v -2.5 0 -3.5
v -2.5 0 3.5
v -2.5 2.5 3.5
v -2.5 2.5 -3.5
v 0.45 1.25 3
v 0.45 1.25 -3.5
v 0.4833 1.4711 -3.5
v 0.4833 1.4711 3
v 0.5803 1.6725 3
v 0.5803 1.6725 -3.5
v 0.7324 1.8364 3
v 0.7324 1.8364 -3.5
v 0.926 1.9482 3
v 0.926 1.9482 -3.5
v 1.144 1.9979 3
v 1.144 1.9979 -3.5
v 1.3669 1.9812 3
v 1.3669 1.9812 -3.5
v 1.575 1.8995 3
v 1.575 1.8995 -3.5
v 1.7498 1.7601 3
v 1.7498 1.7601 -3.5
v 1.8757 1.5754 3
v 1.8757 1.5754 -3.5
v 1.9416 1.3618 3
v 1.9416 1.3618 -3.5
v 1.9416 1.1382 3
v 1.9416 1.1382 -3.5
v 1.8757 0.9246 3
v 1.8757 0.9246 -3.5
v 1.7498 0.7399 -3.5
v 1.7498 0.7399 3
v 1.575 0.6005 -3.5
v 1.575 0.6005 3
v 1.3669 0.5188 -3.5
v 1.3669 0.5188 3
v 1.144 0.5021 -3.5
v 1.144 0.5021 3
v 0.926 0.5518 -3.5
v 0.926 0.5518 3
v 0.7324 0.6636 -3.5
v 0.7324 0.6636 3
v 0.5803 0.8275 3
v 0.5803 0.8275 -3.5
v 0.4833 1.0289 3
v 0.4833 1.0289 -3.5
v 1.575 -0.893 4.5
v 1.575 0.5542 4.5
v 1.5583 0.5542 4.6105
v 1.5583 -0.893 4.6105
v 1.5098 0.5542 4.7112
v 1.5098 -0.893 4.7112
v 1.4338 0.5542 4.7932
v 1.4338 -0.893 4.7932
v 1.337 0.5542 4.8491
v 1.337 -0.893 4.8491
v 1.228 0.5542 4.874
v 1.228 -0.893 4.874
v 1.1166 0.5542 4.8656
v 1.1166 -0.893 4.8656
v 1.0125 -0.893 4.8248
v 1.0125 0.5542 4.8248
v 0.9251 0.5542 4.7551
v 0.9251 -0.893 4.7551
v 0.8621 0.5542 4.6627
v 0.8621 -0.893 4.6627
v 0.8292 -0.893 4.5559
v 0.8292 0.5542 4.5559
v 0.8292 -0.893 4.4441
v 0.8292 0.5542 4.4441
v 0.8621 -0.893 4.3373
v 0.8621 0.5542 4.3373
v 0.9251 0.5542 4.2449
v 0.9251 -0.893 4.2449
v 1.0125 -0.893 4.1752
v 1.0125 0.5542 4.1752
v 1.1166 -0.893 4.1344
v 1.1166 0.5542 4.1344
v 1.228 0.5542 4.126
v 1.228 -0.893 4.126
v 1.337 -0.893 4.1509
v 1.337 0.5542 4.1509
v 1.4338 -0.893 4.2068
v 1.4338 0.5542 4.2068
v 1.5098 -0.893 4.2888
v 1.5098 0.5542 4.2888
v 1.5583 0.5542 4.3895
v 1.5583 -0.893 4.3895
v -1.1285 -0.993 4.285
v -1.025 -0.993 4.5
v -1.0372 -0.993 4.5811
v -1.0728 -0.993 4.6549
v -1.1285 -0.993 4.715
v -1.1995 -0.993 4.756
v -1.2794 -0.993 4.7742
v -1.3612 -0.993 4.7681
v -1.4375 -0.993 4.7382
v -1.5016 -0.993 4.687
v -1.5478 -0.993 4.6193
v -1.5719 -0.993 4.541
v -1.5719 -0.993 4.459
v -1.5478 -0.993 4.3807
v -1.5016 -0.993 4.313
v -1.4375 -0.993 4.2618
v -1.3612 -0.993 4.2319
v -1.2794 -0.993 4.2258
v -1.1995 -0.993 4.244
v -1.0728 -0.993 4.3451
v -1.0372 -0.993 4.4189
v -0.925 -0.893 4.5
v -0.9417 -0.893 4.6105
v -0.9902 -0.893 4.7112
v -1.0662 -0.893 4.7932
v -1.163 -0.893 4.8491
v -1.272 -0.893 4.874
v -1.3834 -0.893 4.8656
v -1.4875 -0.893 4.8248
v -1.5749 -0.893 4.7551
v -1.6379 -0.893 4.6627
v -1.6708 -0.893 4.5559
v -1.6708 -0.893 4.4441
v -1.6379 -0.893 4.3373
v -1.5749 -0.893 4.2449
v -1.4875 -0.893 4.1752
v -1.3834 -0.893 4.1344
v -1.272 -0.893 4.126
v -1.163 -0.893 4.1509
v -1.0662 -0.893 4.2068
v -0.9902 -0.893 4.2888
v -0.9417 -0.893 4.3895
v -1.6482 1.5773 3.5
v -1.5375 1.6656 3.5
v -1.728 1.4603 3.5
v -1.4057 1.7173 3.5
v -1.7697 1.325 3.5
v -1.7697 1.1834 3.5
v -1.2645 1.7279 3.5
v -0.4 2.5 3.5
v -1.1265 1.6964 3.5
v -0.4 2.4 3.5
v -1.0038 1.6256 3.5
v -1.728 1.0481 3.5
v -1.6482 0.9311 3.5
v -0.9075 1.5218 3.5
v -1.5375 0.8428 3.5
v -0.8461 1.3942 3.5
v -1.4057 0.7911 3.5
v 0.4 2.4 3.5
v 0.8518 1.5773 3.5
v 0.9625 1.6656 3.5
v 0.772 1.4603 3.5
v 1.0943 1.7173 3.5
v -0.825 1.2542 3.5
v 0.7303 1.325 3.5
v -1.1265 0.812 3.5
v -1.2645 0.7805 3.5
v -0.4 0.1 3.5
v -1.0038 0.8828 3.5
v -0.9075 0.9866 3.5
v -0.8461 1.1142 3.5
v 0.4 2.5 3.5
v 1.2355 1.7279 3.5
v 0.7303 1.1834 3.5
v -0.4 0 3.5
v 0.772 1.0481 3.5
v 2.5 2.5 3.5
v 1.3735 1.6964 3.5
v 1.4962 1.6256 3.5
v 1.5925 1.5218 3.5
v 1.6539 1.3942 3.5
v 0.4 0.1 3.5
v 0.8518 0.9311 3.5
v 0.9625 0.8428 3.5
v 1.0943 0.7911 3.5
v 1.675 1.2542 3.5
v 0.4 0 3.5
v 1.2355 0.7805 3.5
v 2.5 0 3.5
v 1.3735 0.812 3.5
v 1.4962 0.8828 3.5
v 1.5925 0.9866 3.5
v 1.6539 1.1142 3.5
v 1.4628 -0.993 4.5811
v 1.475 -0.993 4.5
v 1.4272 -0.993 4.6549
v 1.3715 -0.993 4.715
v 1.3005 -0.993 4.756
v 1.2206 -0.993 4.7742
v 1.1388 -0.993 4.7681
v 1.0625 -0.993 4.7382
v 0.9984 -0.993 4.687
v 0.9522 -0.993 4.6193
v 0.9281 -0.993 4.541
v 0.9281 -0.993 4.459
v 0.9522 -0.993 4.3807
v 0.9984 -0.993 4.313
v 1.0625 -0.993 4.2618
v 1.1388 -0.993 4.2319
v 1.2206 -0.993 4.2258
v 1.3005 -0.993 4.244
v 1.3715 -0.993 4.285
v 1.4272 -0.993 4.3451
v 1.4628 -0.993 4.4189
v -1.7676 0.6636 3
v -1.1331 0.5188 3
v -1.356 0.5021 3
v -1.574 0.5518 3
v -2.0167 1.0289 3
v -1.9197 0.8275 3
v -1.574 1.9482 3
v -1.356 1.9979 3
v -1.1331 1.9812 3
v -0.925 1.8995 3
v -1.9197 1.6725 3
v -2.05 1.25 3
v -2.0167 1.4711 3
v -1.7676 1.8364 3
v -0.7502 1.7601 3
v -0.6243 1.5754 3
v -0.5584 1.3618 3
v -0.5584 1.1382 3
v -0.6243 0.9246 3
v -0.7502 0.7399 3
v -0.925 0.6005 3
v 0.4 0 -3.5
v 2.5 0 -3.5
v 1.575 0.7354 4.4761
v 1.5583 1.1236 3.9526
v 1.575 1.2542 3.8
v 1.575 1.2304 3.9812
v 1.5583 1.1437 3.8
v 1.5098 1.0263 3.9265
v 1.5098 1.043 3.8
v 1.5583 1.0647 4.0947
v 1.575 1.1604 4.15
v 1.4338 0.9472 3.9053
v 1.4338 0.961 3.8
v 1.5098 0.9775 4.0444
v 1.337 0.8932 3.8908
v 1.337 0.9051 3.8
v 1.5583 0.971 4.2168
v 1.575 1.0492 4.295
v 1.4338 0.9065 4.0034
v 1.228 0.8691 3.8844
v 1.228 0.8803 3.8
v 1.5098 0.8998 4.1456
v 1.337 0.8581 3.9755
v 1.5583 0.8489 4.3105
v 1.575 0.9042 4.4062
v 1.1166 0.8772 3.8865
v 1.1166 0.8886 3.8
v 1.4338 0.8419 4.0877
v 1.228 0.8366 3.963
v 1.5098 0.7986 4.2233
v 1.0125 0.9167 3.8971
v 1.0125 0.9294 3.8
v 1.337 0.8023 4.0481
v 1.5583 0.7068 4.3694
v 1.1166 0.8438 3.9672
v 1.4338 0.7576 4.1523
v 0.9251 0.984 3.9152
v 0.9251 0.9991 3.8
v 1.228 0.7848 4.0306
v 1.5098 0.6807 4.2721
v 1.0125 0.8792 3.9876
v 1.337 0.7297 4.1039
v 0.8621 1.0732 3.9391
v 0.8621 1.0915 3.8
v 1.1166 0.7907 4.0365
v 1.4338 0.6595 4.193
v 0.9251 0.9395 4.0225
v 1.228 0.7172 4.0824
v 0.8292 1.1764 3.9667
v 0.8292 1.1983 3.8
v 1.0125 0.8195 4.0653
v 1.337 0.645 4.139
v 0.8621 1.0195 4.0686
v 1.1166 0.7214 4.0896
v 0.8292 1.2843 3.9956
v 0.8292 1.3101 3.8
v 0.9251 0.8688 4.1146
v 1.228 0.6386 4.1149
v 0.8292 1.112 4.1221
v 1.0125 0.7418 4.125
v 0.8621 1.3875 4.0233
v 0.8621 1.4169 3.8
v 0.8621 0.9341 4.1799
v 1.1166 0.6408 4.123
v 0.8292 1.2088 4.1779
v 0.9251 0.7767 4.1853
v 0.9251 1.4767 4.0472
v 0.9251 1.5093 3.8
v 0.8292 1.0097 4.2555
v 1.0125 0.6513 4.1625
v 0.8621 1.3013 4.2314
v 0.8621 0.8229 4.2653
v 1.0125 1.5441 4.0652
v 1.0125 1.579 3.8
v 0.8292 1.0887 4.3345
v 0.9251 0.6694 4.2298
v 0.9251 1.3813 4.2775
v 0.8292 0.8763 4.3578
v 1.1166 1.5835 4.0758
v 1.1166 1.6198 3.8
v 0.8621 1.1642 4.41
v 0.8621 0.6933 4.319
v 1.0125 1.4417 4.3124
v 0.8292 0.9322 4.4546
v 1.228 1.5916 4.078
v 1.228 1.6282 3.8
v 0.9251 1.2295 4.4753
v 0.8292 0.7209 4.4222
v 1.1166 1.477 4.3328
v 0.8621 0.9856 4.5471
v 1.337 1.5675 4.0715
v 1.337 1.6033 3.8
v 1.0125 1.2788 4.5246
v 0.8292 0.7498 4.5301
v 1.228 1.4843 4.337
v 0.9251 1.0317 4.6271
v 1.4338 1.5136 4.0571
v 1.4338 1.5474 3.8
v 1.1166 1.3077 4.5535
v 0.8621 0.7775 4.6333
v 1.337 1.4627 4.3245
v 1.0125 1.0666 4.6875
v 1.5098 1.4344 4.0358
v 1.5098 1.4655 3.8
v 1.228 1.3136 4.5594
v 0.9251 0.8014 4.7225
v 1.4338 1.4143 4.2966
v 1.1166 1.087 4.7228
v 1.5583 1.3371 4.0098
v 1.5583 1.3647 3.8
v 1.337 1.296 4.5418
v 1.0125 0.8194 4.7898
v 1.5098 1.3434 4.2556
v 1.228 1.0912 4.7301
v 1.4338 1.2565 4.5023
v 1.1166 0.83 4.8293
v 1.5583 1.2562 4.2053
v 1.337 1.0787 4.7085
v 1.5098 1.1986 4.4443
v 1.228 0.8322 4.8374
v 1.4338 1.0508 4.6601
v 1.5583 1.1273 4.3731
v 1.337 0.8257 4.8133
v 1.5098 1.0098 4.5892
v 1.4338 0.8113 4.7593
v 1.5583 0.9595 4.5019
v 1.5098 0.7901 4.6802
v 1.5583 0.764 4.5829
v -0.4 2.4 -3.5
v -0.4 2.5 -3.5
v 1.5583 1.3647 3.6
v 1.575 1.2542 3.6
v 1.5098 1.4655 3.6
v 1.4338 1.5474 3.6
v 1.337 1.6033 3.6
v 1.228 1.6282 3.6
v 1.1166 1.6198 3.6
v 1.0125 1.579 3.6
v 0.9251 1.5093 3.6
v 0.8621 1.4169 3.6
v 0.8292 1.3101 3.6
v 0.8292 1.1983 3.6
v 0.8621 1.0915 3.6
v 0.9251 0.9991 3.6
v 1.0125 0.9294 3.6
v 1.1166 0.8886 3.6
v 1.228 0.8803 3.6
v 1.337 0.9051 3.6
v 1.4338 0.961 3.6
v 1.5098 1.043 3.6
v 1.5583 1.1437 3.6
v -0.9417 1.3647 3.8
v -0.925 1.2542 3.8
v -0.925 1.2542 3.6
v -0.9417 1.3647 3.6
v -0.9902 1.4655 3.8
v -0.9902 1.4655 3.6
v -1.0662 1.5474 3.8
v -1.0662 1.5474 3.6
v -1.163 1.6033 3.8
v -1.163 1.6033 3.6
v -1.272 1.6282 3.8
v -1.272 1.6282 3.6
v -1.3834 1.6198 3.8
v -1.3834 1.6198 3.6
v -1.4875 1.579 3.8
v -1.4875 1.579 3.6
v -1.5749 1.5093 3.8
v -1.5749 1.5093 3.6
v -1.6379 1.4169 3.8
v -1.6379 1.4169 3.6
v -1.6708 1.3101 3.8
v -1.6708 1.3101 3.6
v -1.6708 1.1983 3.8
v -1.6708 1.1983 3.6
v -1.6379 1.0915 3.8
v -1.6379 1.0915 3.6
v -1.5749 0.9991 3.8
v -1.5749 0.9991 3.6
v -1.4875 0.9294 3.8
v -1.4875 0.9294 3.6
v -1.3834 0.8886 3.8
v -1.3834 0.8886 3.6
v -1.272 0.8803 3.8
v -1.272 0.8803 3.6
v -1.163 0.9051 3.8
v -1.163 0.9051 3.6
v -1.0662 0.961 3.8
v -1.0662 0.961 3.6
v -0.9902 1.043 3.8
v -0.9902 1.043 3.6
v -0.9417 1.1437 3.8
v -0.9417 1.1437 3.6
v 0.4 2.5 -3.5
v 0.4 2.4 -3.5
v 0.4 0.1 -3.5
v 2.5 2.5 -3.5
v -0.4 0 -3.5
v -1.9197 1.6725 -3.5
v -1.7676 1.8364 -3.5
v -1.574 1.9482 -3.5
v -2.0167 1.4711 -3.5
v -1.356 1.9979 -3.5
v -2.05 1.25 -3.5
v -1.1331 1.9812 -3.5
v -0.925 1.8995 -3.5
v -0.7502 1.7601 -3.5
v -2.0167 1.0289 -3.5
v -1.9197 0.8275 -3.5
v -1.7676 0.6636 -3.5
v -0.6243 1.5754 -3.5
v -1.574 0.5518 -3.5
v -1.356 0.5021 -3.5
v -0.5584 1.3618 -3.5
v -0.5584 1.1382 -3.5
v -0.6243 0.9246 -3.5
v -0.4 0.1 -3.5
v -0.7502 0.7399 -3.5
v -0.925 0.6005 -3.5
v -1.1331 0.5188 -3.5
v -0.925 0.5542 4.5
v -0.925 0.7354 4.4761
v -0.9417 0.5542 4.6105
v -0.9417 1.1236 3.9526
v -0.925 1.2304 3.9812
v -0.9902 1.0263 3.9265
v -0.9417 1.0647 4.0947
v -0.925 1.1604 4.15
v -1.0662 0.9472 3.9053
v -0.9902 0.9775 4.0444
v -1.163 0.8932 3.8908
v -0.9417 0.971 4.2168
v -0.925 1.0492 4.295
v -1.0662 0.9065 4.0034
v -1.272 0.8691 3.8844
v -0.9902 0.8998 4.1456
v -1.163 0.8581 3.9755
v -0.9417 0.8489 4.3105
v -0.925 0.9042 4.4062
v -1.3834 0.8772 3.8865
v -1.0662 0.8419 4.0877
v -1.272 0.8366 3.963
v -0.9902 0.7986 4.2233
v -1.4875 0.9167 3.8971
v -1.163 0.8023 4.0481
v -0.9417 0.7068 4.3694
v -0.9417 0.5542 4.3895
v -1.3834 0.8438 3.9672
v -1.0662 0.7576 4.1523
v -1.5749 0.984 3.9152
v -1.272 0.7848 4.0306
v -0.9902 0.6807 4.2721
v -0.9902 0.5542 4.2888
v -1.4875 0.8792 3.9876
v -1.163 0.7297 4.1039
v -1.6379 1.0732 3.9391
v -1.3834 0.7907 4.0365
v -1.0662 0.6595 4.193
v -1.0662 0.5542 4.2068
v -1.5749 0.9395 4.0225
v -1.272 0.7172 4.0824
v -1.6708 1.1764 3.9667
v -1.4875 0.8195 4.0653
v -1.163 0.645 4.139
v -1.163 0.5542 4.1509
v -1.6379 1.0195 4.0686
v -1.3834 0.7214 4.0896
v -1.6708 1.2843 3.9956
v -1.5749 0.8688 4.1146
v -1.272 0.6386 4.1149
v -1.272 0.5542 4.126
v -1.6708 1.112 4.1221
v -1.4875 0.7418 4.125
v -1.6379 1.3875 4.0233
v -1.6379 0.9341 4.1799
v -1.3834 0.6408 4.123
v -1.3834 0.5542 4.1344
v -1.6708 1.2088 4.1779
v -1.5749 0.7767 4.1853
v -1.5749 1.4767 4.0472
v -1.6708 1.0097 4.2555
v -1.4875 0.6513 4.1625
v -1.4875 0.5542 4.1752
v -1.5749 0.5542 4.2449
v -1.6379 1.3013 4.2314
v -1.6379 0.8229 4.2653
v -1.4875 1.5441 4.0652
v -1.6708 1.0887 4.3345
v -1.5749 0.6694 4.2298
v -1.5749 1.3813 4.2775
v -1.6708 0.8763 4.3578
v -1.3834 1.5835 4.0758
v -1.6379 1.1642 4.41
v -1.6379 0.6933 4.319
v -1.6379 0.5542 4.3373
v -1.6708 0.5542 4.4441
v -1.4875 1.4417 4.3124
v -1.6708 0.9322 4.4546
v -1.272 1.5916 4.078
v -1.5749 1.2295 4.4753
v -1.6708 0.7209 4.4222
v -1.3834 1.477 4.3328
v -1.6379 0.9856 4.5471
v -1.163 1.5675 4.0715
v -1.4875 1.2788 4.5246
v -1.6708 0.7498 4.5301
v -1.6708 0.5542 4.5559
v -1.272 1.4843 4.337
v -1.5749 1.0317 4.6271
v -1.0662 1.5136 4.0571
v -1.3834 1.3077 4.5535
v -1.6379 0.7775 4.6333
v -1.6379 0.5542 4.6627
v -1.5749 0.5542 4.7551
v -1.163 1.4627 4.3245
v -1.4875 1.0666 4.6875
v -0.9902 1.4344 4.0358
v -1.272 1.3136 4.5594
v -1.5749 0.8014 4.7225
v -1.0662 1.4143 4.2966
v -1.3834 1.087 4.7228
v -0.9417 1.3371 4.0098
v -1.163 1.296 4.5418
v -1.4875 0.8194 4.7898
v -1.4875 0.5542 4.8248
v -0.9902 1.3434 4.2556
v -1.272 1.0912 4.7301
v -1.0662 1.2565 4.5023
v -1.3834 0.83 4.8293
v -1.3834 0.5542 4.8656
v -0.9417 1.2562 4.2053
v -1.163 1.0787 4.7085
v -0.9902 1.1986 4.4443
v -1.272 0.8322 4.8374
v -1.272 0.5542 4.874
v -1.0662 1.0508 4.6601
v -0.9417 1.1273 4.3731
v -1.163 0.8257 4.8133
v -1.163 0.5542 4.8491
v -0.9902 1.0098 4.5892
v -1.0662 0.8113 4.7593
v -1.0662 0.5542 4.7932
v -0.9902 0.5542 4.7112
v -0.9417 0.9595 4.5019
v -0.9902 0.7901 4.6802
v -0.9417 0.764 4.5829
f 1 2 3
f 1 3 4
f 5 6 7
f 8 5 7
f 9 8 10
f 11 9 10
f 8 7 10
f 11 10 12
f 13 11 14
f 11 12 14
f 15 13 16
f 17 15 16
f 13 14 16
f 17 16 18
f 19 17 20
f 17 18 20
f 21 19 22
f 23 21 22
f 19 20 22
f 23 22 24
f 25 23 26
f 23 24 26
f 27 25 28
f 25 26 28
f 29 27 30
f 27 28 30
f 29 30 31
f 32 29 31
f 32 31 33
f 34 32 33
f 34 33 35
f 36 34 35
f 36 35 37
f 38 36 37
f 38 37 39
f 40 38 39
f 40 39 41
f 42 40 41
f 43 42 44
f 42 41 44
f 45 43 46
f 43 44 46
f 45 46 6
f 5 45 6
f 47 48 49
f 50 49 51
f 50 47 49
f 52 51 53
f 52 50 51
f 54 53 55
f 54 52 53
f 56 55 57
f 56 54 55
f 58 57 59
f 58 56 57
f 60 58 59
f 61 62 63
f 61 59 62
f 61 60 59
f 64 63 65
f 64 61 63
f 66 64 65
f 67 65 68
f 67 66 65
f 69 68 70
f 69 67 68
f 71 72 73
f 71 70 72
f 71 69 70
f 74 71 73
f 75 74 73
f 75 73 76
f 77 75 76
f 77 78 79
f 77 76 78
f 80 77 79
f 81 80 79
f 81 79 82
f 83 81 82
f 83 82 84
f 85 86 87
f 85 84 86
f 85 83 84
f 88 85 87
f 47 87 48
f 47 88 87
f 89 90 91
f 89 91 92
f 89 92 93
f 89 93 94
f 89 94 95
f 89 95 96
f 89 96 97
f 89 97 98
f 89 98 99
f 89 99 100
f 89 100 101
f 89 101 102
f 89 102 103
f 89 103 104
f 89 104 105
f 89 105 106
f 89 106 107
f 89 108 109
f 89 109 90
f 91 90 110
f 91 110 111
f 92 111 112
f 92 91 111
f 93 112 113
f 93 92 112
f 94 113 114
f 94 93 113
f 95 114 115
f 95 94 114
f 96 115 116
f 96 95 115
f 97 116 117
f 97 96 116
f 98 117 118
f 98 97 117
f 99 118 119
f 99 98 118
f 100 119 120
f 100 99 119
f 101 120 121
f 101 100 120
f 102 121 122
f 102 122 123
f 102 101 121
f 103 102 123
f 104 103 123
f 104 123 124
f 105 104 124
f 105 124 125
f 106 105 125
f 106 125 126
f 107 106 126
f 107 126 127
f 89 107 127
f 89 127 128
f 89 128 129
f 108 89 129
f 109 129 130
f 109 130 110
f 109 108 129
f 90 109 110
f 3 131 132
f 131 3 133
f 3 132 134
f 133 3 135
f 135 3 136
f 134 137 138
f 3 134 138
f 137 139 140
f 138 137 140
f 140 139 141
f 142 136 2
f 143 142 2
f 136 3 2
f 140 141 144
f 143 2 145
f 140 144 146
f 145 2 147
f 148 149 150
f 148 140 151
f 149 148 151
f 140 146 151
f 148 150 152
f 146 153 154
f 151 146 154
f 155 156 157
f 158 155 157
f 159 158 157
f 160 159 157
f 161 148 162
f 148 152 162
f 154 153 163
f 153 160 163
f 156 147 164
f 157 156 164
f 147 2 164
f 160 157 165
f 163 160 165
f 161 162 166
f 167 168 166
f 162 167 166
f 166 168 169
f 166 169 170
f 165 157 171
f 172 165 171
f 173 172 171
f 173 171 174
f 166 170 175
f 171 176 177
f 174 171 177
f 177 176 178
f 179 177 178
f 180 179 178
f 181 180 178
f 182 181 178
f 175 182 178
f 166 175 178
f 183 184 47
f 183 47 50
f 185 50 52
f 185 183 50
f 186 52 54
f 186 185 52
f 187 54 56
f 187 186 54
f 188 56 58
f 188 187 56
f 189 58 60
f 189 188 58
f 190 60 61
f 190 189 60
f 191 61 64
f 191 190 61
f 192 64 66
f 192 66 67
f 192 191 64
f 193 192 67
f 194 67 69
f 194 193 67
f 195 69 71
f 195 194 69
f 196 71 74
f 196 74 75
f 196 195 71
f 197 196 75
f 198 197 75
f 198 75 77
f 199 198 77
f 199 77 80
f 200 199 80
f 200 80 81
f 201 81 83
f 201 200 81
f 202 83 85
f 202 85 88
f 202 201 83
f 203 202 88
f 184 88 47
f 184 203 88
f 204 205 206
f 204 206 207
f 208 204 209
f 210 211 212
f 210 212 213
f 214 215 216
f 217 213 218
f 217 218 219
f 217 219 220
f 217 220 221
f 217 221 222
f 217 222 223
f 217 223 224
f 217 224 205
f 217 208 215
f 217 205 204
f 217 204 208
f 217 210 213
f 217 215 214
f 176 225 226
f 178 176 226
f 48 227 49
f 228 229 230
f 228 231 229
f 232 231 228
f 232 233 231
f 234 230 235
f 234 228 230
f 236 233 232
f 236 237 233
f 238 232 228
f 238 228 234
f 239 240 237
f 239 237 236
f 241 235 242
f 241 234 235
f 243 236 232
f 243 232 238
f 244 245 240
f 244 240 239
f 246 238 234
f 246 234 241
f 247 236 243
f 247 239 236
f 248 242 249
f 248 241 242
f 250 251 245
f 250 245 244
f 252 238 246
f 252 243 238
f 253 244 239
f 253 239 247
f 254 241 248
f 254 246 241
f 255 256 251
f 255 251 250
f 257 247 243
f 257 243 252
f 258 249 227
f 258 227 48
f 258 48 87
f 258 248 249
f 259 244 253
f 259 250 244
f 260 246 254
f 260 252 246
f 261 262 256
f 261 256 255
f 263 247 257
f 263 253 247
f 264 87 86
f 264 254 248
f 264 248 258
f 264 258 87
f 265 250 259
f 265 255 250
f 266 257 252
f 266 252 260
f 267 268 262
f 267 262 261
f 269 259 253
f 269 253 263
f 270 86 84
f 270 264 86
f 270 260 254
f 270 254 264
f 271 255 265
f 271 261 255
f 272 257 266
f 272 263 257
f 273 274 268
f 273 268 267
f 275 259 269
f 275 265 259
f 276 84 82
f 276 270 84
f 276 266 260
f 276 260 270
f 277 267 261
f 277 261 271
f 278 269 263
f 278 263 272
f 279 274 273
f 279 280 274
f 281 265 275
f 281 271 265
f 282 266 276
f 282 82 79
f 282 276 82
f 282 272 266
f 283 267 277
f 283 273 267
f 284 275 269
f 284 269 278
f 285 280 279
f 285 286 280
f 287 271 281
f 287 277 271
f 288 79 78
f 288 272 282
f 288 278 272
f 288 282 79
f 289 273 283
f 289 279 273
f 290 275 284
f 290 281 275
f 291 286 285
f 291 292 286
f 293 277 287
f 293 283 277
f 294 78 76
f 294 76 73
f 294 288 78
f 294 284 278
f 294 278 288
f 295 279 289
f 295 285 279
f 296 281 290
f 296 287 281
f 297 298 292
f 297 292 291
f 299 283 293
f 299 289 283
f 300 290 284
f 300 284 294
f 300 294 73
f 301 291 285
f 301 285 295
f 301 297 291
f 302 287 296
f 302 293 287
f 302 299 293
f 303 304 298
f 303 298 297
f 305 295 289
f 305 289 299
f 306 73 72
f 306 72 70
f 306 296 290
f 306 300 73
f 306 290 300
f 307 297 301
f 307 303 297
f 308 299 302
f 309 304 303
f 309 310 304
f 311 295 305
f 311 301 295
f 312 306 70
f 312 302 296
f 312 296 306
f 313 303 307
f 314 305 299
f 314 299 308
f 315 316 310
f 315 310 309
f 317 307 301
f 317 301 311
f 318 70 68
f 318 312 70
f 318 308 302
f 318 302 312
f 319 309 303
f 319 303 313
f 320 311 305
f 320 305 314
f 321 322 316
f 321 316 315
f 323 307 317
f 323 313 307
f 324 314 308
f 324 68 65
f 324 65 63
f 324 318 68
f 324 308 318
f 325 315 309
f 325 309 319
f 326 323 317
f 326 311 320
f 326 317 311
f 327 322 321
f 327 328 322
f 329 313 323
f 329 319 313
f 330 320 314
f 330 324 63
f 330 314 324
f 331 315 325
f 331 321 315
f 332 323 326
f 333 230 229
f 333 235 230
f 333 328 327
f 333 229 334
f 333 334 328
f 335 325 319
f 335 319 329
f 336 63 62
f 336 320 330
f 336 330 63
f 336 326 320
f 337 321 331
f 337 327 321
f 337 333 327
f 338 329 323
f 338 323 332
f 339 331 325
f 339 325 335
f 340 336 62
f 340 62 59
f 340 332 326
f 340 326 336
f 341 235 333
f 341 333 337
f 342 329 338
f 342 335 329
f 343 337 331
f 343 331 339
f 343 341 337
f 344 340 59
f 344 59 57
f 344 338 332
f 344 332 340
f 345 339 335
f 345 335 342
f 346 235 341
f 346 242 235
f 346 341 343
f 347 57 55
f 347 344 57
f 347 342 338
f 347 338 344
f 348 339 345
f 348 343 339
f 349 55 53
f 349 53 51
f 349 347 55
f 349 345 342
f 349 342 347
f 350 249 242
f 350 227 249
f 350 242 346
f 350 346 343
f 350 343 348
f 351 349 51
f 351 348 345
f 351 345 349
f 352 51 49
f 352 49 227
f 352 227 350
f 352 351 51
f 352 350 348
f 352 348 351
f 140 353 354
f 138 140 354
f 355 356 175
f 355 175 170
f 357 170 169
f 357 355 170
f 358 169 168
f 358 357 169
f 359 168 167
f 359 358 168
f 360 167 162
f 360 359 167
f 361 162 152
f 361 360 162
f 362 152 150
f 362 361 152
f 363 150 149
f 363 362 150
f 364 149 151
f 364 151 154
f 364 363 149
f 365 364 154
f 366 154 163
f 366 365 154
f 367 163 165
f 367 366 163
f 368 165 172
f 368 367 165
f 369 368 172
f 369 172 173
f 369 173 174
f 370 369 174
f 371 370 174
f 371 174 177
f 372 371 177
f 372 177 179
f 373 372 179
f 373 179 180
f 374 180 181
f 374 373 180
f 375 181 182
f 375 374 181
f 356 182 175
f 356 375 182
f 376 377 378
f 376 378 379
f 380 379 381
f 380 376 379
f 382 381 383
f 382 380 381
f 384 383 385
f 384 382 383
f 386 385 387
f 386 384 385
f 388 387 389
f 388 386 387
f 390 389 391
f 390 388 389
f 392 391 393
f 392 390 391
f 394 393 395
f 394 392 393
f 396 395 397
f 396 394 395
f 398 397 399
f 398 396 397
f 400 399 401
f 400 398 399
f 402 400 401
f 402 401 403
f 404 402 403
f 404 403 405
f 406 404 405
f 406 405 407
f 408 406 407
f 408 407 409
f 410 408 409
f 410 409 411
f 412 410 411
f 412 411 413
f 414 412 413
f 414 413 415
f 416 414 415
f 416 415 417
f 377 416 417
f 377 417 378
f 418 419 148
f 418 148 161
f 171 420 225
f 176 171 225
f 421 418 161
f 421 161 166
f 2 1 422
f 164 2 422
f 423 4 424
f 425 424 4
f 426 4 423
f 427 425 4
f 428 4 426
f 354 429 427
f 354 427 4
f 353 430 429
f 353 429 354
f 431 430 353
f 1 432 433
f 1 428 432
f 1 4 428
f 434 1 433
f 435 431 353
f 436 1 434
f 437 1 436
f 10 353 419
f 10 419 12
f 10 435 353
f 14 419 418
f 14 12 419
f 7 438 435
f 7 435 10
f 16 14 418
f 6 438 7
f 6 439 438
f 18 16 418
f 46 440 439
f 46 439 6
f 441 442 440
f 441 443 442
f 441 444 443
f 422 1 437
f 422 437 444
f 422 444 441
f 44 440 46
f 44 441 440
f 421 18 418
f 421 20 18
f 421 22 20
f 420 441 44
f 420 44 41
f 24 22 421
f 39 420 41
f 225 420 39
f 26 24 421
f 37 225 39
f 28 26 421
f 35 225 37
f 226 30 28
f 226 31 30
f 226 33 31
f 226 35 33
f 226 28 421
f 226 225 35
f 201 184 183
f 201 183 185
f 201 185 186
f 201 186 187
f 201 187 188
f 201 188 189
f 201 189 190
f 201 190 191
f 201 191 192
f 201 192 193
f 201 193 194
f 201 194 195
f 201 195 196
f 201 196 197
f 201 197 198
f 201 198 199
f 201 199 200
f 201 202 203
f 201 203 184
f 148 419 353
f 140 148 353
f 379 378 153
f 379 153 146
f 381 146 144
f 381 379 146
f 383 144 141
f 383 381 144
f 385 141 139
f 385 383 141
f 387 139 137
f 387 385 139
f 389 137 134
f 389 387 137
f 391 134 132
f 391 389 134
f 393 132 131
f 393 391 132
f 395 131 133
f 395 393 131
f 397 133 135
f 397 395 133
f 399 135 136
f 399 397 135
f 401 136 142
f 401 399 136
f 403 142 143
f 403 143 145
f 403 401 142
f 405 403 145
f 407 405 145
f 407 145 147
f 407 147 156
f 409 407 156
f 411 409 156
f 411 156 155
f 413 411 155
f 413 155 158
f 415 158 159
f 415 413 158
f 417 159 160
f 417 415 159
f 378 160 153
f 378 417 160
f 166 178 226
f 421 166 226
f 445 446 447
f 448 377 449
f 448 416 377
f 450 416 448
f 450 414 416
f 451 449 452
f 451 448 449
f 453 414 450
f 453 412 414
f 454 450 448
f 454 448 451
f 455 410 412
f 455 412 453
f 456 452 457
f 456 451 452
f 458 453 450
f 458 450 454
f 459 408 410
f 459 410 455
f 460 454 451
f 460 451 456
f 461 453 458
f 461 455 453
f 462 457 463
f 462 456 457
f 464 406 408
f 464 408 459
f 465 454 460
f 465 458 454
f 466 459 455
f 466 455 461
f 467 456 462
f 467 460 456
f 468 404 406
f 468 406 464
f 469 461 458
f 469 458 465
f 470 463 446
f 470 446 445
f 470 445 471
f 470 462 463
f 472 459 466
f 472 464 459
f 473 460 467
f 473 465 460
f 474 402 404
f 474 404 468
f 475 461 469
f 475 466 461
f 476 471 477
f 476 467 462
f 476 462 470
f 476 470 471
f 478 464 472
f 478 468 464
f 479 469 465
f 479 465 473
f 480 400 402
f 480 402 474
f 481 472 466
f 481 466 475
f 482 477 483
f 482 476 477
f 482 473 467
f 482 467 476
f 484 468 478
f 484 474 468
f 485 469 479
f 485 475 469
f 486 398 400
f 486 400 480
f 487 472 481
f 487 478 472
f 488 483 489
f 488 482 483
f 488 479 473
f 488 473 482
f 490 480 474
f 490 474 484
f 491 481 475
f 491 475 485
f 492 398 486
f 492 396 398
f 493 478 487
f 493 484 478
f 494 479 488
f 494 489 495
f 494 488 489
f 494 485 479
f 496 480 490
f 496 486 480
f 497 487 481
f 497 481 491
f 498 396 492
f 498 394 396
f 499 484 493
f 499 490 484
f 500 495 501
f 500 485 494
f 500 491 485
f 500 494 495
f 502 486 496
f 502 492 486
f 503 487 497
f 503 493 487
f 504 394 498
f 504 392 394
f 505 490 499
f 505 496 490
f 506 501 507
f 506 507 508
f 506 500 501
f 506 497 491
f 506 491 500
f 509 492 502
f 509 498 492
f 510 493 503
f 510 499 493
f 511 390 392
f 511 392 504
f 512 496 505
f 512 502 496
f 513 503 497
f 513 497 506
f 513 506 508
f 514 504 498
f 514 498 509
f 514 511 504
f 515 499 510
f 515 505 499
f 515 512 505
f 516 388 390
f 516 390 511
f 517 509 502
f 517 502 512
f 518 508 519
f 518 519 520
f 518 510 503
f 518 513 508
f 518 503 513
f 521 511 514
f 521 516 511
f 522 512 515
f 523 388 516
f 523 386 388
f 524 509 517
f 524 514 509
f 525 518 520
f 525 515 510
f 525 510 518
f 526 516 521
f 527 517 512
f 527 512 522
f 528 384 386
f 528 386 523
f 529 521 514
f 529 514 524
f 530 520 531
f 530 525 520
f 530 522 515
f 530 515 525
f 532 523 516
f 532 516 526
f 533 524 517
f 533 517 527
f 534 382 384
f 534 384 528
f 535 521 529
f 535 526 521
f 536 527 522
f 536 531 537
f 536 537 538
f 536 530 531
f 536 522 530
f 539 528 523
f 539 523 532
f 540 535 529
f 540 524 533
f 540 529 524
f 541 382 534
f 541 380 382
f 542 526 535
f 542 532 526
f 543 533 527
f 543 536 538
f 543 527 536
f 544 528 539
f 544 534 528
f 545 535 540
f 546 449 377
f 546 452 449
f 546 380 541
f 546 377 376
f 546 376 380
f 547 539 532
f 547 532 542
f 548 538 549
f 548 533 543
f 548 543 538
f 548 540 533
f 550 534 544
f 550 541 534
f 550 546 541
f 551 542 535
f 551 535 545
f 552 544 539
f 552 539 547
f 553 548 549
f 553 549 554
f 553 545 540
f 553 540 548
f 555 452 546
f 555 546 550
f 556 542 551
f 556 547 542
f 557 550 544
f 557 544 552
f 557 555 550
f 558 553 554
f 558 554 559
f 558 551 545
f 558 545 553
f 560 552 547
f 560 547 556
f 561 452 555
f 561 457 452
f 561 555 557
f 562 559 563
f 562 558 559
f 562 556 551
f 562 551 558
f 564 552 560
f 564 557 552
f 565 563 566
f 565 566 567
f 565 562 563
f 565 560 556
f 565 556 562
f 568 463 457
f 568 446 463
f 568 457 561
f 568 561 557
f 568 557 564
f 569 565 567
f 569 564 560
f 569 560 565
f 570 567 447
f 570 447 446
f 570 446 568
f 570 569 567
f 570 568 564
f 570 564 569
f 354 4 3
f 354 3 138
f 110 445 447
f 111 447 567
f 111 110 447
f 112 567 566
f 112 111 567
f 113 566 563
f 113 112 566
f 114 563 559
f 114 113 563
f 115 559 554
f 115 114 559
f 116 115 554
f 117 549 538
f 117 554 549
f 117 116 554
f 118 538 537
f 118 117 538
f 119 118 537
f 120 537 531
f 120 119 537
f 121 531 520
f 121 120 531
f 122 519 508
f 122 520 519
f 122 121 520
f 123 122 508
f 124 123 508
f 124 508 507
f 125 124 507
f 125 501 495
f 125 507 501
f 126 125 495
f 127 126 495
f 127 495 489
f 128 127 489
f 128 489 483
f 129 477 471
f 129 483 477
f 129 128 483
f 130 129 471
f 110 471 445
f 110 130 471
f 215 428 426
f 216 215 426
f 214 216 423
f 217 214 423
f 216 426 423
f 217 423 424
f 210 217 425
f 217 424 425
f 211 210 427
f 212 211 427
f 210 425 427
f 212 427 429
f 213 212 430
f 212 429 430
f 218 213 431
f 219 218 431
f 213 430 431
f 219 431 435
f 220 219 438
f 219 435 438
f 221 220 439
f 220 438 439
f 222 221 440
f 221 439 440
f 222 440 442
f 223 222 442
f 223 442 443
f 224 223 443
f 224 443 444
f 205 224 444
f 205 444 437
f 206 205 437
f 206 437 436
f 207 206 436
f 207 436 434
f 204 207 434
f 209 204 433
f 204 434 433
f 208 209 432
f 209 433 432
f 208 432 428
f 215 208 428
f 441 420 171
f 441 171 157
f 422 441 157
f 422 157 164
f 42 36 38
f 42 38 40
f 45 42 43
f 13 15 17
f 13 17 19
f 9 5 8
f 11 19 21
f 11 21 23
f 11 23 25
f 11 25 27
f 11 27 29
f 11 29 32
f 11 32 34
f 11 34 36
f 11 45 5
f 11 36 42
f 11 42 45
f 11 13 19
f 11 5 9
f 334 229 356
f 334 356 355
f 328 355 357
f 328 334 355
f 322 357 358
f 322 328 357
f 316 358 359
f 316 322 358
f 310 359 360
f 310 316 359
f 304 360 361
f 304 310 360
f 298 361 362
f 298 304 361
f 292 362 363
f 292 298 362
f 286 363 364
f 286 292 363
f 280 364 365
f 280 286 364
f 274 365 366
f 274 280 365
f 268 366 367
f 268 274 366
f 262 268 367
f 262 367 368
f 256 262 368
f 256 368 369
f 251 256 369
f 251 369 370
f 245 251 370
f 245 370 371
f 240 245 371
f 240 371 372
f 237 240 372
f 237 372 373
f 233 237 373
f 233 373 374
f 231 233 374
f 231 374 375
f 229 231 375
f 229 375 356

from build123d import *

# Parameters (mm, degrees)
SKETCH1_W                  = 5
SKETCH1_H                  = 7
BOSS_EXTRUDE1_DEPTH        = 2.5
SKETCH2_R                  = 0.75
CUT_EXTRUDE1_DEPTH         = 6.5
SKETCH4_R                  = 0.375
CHAMFER1_SIZE              = 0.1
SKETCH5_W                  = 0.8
SKETCH5_H                  = 0.1
CUT_EXTRUDE2_DEPTH         = 10.09068901
LPATTERN1_COUNT            = 2
LPATTERN1_PITCH            = 2.5
LPATTERN2_COUNT            = 2
LPATTERN2_PITCH            = 2.5
CHAMFER1_OF_LPATTERN2_SIZE = 0.1


with BuildPart() as part:
    # Sketch1 → Boss-Extrude1 (new body)
    with BuildSketch(Plane(origin=(0, 0, 0), x_dir=(1, 0, 0), z_dir=(0, 1, 0))):
        Rectangle(SKETCH1_W, SKETCH1_H)
    extrude(amount=BOSS_EXTRUDE1_DEPTH)

    # Sketch2 → Cut-Extrude1 (cut)
    with BuildSketch(Plane(origin=(0, 0, -3.5), x_dir=(-1, 0, 0), z_dir=(0, 0, -1))):
        with Locations((-1.2, 1.25)):
            Circle(SKETCH2_R)
    cut_extrude1 = extrude(amount=-CUT_EXTRUDE1_DEPTH, mode=Mode.SUBTRACT)

    # Sweep1: sweep along a path in Sketch3
    with BuildLine(Plane(origin=(1.2, 0, 0), x_dir=(0, 0, -1), z_dir=(1, 0, 0))) as sweep1_path:
        Line((-3.5, 1.254208417), (-3.8, 1.254208417))
        ThreePointArc((-3.8, 1.254208417), (-4.294974747, 1.049183164), (-4.5, 0.554208417))
        Line((-4.5, 0.554208417), (-4.5, -0.992950224))
    # Sketch4 → Sweep1 (sweep)
    with BuildSketch(Plane.XY.offset(3.5)):
        with Locations((1.2, 1.254208417)):
            Circle(SKETCH4_R)
    sweep1 = sweep(path=sweep1_path.line)

    # Chamfer1
    chamfer1_edges = [part.edges().sort_by_distance(p)[0] for p in [
        (0.825, 1.254208417, 3.5),
        (0.825, -0.992950224, 4.5),
    ]]
    chamfer(chamfer1_edges, length=CHAMFER1_SIZE)

    # Sketch5 → Cut-Extrude2 (cut, through all)
    with BuildSketch(Plane(origin=(0, 0, -3.5), x_dir=(-1, 0, 0), z_dir=(0, 0, -1))):
        with Locations((0, 2.45)):
            Rectangle(SKETCH5_W, SKETCH5_H)
    cut_extrude2 = extrude(amount=-CUT_EXTRUDE2_DEPTH, mode=Mode.SUBTRACT)

    # Mirror6: Cut-Extrude2 across plane
    add(cut_extrude2.mirror(Plane(origin=(0, 1.25, 0), x_dir=(0, 0, 1), z_dir=(0, -1, 0))), mode=Mode.SUBTRACT)

    # LPattern1: Cut-Extrude1 ×2
    with Locations(*[(-i * LPATTERN1_PITCH, 0, 0) for i in range(1, LPATTERN1_COUNT)]):
        add(cut_extrude1, mode=Mode.SUBTRACT)

    # LPattern2: Sweep1 ×2
    with Locations(*[(-i * LPATTERN2_PITCH, 0, 0) for i in range(1, LPATTERN2_COUNT)]):
        add(sweep1)

    # Chamfer1 of LPattern2
    chamfer1_of_lpattern2_edges = [part.edges().sort_by_distance(p)[0] for p in [
        (-1.675, 1.254208417, 3.5),
        (-1.675, -0.992950224, 4.5),
    ]]
    chamfer(chamfer1_of_lpattern2_edges, length=CHAMFER1_OF_LPATTERN2_SIZE)


solid = part.part
